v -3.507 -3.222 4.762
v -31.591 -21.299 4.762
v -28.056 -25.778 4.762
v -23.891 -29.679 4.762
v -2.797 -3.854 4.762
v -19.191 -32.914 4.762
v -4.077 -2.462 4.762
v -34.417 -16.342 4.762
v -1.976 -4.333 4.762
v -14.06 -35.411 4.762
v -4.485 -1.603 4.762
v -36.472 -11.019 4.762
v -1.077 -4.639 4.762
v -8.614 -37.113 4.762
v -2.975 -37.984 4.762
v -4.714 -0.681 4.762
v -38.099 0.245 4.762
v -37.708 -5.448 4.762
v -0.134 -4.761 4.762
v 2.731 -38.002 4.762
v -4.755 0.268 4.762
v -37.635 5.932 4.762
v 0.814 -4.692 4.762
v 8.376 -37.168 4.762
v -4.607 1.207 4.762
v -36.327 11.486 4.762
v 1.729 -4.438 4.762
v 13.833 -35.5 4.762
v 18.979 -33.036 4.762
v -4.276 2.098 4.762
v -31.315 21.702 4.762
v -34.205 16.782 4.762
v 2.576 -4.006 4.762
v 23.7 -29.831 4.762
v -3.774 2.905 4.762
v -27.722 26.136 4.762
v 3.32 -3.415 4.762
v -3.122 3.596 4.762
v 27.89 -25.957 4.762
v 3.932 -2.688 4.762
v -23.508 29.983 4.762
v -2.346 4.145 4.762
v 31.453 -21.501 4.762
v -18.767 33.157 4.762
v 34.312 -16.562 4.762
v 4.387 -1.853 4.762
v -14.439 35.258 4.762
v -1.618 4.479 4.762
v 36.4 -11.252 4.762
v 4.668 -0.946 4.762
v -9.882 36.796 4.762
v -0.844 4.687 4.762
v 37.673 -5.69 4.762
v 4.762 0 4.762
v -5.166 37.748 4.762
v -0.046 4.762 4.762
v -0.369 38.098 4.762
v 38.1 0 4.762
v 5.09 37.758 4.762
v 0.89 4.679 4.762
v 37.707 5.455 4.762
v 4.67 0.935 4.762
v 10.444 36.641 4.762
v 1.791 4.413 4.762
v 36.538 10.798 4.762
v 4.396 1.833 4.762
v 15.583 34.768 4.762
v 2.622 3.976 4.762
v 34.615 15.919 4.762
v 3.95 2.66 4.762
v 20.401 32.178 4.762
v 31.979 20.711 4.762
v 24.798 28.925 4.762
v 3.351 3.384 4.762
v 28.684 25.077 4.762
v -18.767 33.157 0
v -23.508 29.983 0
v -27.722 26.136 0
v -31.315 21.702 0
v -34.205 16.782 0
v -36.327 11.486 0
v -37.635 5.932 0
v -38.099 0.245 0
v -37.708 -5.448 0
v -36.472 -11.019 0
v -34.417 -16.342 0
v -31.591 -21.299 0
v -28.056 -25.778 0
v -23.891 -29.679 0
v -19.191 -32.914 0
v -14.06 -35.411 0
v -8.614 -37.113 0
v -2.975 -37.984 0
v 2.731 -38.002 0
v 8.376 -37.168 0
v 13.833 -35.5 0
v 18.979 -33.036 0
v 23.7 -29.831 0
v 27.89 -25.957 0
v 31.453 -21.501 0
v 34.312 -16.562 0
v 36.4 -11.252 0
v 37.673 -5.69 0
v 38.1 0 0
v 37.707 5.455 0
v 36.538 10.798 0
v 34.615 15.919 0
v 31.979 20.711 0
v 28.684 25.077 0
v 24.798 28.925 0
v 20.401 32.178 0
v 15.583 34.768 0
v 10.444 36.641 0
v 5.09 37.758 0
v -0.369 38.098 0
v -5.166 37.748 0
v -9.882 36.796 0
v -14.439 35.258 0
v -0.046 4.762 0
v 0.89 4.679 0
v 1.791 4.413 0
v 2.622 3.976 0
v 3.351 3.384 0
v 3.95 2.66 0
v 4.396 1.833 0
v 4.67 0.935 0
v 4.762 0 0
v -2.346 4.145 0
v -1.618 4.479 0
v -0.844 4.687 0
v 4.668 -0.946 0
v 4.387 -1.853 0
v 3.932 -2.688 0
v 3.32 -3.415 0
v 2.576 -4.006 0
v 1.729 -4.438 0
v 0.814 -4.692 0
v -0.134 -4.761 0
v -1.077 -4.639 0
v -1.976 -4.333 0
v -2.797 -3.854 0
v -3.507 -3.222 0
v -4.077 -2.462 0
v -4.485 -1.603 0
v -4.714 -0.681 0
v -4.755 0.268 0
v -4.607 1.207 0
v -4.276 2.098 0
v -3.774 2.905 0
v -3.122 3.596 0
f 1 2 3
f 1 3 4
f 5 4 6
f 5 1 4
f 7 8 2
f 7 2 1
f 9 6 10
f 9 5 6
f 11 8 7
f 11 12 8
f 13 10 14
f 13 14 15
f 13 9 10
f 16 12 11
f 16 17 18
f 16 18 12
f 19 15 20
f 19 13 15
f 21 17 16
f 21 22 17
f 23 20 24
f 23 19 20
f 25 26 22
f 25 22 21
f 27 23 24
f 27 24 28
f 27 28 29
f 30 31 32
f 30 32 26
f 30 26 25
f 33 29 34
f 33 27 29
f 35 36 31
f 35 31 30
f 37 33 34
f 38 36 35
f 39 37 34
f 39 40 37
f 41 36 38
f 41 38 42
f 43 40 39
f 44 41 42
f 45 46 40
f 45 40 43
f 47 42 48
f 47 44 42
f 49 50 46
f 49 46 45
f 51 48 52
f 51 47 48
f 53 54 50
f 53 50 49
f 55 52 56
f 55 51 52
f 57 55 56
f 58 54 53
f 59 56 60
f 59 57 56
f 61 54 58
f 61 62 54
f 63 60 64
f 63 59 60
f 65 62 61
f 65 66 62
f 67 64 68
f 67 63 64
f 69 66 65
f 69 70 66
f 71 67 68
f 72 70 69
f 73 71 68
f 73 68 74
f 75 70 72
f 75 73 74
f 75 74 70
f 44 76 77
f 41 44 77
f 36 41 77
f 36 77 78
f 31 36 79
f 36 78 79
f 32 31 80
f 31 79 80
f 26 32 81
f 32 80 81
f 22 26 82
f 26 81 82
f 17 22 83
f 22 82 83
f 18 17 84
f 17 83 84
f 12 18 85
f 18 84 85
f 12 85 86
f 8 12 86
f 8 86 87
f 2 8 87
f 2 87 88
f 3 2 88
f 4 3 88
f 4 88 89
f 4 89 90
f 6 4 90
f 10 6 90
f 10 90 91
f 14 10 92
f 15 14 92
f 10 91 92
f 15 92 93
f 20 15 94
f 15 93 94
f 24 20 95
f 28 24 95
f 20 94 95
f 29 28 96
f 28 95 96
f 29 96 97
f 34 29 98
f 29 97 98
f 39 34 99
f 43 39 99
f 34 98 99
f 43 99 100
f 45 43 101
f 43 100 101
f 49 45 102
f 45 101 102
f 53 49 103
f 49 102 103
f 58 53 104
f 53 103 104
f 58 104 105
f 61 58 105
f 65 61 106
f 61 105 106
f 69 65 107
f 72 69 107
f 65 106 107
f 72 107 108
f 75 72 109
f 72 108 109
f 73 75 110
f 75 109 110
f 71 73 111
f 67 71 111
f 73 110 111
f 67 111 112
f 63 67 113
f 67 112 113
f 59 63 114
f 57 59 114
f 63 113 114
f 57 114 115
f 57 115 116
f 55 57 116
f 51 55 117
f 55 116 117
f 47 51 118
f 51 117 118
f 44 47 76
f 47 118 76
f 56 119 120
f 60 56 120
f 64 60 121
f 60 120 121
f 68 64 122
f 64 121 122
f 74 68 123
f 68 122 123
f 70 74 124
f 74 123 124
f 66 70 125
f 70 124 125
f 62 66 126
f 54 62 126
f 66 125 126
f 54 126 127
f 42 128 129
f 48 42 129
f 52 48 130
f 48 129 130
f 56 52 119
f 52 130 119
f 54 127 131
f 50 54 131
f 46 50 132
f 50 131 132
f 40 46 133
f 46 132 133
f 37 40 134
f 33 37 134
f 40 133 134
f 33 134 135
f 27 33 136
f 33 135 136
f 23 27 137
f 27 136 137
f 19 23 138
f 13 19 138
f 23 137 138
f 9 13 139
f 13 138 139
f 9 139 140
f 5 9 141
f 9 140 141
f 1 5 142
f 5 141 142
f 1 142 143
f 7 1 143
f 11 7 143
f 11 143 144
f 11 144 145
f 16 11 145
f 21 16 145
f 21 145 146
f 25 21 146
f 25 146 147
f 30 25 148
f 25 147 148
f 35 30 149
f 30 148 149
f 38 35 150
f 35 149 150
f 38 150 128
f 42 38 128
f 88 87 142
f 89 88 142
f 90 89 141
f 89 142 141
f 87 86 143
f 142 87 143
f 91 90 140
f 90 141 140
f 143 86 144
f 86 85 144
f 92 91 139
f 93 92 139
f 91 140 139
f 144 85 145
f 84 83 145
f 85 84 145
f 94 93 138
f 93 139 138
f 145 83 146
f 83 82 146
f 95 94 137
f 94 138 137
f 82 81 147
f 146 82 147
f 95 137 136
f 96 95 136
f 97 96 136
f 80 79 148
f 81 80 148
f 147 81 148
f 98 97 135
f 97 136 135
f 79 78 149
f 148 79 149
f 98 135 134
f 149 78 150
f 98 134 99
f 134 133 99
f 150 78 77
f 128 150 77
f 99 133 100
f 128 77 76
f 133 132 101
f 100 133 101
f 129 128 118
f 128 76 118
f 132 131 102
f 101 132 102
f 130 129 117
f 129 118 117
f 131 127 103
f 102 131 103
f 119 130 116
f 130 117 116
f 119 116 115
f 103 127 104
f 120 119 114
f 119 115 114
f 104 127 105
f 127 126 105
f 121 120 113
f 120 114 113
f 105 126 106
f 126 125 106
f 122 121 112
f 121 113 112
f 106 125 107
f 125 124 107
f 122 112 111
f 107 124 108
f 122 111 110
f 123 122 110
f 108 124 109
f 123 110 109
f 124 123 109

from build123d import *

# Parameters (mm, degrees)
F1_DEPTH = 4.7625


with BuildPart() as f1:
    # F0 (on Top) → F1 (new body)
    with BuildSketch(Plane.XY):
        with BuildLine():
            ThreePointArc((-18.7669216404, 33.1573921192), (-19.1910172412, -32.9137487572), (38.1, 0))
            ThreePointArc((38.1, 0), (26.8100597322, 27.0708458891), (-0.3688030002, 38.0982149759))
            Line((-0.3688030002, 38.0982149759), (-0.046100375, 4.762276872))
            ThreePointArc((-0.046100375, 4.762276872), (3.3512574665, 3.3838557361), (4.7625, 0))
            ThreePointArc((4.7625, 0), (-2.3988771551, -4.1142185946), (-2.345865205, 4.1446740149))
            Line((-2.345865205, 4.1446740149), (-18.7669216404, 33.1573921192))
        make_face()
        with BuildLine():
            Line((-18.7669216404, 33.1573921192), (-0.3688030002, 38.0982149759))
            ThreePointArc((-0.3688030002, 38.0982149759), (-9.8816457134, 36.7962372804), (-18.7669216404, 33.1573921192))
        make_face()
        with BuildLine():
            Line((-0.046100375, 4.762276872), (-0.3688030002, 38.0982149759))
            Line((-0.3688030002, 38.0982149759), (-18.7669216404, 33.1573921192))
            Line((-18.7669216404, 33.1573921192), (-2.345865205, 4.1446740149))
            ThreePointArc((-2.345865205, 4.1446740149), (-1.2352057142, 4.59952966), (-0.046100375, 4.762276872))
        make_face()
    extrude(amount=F1_DEPTH)


solid = f1.part
